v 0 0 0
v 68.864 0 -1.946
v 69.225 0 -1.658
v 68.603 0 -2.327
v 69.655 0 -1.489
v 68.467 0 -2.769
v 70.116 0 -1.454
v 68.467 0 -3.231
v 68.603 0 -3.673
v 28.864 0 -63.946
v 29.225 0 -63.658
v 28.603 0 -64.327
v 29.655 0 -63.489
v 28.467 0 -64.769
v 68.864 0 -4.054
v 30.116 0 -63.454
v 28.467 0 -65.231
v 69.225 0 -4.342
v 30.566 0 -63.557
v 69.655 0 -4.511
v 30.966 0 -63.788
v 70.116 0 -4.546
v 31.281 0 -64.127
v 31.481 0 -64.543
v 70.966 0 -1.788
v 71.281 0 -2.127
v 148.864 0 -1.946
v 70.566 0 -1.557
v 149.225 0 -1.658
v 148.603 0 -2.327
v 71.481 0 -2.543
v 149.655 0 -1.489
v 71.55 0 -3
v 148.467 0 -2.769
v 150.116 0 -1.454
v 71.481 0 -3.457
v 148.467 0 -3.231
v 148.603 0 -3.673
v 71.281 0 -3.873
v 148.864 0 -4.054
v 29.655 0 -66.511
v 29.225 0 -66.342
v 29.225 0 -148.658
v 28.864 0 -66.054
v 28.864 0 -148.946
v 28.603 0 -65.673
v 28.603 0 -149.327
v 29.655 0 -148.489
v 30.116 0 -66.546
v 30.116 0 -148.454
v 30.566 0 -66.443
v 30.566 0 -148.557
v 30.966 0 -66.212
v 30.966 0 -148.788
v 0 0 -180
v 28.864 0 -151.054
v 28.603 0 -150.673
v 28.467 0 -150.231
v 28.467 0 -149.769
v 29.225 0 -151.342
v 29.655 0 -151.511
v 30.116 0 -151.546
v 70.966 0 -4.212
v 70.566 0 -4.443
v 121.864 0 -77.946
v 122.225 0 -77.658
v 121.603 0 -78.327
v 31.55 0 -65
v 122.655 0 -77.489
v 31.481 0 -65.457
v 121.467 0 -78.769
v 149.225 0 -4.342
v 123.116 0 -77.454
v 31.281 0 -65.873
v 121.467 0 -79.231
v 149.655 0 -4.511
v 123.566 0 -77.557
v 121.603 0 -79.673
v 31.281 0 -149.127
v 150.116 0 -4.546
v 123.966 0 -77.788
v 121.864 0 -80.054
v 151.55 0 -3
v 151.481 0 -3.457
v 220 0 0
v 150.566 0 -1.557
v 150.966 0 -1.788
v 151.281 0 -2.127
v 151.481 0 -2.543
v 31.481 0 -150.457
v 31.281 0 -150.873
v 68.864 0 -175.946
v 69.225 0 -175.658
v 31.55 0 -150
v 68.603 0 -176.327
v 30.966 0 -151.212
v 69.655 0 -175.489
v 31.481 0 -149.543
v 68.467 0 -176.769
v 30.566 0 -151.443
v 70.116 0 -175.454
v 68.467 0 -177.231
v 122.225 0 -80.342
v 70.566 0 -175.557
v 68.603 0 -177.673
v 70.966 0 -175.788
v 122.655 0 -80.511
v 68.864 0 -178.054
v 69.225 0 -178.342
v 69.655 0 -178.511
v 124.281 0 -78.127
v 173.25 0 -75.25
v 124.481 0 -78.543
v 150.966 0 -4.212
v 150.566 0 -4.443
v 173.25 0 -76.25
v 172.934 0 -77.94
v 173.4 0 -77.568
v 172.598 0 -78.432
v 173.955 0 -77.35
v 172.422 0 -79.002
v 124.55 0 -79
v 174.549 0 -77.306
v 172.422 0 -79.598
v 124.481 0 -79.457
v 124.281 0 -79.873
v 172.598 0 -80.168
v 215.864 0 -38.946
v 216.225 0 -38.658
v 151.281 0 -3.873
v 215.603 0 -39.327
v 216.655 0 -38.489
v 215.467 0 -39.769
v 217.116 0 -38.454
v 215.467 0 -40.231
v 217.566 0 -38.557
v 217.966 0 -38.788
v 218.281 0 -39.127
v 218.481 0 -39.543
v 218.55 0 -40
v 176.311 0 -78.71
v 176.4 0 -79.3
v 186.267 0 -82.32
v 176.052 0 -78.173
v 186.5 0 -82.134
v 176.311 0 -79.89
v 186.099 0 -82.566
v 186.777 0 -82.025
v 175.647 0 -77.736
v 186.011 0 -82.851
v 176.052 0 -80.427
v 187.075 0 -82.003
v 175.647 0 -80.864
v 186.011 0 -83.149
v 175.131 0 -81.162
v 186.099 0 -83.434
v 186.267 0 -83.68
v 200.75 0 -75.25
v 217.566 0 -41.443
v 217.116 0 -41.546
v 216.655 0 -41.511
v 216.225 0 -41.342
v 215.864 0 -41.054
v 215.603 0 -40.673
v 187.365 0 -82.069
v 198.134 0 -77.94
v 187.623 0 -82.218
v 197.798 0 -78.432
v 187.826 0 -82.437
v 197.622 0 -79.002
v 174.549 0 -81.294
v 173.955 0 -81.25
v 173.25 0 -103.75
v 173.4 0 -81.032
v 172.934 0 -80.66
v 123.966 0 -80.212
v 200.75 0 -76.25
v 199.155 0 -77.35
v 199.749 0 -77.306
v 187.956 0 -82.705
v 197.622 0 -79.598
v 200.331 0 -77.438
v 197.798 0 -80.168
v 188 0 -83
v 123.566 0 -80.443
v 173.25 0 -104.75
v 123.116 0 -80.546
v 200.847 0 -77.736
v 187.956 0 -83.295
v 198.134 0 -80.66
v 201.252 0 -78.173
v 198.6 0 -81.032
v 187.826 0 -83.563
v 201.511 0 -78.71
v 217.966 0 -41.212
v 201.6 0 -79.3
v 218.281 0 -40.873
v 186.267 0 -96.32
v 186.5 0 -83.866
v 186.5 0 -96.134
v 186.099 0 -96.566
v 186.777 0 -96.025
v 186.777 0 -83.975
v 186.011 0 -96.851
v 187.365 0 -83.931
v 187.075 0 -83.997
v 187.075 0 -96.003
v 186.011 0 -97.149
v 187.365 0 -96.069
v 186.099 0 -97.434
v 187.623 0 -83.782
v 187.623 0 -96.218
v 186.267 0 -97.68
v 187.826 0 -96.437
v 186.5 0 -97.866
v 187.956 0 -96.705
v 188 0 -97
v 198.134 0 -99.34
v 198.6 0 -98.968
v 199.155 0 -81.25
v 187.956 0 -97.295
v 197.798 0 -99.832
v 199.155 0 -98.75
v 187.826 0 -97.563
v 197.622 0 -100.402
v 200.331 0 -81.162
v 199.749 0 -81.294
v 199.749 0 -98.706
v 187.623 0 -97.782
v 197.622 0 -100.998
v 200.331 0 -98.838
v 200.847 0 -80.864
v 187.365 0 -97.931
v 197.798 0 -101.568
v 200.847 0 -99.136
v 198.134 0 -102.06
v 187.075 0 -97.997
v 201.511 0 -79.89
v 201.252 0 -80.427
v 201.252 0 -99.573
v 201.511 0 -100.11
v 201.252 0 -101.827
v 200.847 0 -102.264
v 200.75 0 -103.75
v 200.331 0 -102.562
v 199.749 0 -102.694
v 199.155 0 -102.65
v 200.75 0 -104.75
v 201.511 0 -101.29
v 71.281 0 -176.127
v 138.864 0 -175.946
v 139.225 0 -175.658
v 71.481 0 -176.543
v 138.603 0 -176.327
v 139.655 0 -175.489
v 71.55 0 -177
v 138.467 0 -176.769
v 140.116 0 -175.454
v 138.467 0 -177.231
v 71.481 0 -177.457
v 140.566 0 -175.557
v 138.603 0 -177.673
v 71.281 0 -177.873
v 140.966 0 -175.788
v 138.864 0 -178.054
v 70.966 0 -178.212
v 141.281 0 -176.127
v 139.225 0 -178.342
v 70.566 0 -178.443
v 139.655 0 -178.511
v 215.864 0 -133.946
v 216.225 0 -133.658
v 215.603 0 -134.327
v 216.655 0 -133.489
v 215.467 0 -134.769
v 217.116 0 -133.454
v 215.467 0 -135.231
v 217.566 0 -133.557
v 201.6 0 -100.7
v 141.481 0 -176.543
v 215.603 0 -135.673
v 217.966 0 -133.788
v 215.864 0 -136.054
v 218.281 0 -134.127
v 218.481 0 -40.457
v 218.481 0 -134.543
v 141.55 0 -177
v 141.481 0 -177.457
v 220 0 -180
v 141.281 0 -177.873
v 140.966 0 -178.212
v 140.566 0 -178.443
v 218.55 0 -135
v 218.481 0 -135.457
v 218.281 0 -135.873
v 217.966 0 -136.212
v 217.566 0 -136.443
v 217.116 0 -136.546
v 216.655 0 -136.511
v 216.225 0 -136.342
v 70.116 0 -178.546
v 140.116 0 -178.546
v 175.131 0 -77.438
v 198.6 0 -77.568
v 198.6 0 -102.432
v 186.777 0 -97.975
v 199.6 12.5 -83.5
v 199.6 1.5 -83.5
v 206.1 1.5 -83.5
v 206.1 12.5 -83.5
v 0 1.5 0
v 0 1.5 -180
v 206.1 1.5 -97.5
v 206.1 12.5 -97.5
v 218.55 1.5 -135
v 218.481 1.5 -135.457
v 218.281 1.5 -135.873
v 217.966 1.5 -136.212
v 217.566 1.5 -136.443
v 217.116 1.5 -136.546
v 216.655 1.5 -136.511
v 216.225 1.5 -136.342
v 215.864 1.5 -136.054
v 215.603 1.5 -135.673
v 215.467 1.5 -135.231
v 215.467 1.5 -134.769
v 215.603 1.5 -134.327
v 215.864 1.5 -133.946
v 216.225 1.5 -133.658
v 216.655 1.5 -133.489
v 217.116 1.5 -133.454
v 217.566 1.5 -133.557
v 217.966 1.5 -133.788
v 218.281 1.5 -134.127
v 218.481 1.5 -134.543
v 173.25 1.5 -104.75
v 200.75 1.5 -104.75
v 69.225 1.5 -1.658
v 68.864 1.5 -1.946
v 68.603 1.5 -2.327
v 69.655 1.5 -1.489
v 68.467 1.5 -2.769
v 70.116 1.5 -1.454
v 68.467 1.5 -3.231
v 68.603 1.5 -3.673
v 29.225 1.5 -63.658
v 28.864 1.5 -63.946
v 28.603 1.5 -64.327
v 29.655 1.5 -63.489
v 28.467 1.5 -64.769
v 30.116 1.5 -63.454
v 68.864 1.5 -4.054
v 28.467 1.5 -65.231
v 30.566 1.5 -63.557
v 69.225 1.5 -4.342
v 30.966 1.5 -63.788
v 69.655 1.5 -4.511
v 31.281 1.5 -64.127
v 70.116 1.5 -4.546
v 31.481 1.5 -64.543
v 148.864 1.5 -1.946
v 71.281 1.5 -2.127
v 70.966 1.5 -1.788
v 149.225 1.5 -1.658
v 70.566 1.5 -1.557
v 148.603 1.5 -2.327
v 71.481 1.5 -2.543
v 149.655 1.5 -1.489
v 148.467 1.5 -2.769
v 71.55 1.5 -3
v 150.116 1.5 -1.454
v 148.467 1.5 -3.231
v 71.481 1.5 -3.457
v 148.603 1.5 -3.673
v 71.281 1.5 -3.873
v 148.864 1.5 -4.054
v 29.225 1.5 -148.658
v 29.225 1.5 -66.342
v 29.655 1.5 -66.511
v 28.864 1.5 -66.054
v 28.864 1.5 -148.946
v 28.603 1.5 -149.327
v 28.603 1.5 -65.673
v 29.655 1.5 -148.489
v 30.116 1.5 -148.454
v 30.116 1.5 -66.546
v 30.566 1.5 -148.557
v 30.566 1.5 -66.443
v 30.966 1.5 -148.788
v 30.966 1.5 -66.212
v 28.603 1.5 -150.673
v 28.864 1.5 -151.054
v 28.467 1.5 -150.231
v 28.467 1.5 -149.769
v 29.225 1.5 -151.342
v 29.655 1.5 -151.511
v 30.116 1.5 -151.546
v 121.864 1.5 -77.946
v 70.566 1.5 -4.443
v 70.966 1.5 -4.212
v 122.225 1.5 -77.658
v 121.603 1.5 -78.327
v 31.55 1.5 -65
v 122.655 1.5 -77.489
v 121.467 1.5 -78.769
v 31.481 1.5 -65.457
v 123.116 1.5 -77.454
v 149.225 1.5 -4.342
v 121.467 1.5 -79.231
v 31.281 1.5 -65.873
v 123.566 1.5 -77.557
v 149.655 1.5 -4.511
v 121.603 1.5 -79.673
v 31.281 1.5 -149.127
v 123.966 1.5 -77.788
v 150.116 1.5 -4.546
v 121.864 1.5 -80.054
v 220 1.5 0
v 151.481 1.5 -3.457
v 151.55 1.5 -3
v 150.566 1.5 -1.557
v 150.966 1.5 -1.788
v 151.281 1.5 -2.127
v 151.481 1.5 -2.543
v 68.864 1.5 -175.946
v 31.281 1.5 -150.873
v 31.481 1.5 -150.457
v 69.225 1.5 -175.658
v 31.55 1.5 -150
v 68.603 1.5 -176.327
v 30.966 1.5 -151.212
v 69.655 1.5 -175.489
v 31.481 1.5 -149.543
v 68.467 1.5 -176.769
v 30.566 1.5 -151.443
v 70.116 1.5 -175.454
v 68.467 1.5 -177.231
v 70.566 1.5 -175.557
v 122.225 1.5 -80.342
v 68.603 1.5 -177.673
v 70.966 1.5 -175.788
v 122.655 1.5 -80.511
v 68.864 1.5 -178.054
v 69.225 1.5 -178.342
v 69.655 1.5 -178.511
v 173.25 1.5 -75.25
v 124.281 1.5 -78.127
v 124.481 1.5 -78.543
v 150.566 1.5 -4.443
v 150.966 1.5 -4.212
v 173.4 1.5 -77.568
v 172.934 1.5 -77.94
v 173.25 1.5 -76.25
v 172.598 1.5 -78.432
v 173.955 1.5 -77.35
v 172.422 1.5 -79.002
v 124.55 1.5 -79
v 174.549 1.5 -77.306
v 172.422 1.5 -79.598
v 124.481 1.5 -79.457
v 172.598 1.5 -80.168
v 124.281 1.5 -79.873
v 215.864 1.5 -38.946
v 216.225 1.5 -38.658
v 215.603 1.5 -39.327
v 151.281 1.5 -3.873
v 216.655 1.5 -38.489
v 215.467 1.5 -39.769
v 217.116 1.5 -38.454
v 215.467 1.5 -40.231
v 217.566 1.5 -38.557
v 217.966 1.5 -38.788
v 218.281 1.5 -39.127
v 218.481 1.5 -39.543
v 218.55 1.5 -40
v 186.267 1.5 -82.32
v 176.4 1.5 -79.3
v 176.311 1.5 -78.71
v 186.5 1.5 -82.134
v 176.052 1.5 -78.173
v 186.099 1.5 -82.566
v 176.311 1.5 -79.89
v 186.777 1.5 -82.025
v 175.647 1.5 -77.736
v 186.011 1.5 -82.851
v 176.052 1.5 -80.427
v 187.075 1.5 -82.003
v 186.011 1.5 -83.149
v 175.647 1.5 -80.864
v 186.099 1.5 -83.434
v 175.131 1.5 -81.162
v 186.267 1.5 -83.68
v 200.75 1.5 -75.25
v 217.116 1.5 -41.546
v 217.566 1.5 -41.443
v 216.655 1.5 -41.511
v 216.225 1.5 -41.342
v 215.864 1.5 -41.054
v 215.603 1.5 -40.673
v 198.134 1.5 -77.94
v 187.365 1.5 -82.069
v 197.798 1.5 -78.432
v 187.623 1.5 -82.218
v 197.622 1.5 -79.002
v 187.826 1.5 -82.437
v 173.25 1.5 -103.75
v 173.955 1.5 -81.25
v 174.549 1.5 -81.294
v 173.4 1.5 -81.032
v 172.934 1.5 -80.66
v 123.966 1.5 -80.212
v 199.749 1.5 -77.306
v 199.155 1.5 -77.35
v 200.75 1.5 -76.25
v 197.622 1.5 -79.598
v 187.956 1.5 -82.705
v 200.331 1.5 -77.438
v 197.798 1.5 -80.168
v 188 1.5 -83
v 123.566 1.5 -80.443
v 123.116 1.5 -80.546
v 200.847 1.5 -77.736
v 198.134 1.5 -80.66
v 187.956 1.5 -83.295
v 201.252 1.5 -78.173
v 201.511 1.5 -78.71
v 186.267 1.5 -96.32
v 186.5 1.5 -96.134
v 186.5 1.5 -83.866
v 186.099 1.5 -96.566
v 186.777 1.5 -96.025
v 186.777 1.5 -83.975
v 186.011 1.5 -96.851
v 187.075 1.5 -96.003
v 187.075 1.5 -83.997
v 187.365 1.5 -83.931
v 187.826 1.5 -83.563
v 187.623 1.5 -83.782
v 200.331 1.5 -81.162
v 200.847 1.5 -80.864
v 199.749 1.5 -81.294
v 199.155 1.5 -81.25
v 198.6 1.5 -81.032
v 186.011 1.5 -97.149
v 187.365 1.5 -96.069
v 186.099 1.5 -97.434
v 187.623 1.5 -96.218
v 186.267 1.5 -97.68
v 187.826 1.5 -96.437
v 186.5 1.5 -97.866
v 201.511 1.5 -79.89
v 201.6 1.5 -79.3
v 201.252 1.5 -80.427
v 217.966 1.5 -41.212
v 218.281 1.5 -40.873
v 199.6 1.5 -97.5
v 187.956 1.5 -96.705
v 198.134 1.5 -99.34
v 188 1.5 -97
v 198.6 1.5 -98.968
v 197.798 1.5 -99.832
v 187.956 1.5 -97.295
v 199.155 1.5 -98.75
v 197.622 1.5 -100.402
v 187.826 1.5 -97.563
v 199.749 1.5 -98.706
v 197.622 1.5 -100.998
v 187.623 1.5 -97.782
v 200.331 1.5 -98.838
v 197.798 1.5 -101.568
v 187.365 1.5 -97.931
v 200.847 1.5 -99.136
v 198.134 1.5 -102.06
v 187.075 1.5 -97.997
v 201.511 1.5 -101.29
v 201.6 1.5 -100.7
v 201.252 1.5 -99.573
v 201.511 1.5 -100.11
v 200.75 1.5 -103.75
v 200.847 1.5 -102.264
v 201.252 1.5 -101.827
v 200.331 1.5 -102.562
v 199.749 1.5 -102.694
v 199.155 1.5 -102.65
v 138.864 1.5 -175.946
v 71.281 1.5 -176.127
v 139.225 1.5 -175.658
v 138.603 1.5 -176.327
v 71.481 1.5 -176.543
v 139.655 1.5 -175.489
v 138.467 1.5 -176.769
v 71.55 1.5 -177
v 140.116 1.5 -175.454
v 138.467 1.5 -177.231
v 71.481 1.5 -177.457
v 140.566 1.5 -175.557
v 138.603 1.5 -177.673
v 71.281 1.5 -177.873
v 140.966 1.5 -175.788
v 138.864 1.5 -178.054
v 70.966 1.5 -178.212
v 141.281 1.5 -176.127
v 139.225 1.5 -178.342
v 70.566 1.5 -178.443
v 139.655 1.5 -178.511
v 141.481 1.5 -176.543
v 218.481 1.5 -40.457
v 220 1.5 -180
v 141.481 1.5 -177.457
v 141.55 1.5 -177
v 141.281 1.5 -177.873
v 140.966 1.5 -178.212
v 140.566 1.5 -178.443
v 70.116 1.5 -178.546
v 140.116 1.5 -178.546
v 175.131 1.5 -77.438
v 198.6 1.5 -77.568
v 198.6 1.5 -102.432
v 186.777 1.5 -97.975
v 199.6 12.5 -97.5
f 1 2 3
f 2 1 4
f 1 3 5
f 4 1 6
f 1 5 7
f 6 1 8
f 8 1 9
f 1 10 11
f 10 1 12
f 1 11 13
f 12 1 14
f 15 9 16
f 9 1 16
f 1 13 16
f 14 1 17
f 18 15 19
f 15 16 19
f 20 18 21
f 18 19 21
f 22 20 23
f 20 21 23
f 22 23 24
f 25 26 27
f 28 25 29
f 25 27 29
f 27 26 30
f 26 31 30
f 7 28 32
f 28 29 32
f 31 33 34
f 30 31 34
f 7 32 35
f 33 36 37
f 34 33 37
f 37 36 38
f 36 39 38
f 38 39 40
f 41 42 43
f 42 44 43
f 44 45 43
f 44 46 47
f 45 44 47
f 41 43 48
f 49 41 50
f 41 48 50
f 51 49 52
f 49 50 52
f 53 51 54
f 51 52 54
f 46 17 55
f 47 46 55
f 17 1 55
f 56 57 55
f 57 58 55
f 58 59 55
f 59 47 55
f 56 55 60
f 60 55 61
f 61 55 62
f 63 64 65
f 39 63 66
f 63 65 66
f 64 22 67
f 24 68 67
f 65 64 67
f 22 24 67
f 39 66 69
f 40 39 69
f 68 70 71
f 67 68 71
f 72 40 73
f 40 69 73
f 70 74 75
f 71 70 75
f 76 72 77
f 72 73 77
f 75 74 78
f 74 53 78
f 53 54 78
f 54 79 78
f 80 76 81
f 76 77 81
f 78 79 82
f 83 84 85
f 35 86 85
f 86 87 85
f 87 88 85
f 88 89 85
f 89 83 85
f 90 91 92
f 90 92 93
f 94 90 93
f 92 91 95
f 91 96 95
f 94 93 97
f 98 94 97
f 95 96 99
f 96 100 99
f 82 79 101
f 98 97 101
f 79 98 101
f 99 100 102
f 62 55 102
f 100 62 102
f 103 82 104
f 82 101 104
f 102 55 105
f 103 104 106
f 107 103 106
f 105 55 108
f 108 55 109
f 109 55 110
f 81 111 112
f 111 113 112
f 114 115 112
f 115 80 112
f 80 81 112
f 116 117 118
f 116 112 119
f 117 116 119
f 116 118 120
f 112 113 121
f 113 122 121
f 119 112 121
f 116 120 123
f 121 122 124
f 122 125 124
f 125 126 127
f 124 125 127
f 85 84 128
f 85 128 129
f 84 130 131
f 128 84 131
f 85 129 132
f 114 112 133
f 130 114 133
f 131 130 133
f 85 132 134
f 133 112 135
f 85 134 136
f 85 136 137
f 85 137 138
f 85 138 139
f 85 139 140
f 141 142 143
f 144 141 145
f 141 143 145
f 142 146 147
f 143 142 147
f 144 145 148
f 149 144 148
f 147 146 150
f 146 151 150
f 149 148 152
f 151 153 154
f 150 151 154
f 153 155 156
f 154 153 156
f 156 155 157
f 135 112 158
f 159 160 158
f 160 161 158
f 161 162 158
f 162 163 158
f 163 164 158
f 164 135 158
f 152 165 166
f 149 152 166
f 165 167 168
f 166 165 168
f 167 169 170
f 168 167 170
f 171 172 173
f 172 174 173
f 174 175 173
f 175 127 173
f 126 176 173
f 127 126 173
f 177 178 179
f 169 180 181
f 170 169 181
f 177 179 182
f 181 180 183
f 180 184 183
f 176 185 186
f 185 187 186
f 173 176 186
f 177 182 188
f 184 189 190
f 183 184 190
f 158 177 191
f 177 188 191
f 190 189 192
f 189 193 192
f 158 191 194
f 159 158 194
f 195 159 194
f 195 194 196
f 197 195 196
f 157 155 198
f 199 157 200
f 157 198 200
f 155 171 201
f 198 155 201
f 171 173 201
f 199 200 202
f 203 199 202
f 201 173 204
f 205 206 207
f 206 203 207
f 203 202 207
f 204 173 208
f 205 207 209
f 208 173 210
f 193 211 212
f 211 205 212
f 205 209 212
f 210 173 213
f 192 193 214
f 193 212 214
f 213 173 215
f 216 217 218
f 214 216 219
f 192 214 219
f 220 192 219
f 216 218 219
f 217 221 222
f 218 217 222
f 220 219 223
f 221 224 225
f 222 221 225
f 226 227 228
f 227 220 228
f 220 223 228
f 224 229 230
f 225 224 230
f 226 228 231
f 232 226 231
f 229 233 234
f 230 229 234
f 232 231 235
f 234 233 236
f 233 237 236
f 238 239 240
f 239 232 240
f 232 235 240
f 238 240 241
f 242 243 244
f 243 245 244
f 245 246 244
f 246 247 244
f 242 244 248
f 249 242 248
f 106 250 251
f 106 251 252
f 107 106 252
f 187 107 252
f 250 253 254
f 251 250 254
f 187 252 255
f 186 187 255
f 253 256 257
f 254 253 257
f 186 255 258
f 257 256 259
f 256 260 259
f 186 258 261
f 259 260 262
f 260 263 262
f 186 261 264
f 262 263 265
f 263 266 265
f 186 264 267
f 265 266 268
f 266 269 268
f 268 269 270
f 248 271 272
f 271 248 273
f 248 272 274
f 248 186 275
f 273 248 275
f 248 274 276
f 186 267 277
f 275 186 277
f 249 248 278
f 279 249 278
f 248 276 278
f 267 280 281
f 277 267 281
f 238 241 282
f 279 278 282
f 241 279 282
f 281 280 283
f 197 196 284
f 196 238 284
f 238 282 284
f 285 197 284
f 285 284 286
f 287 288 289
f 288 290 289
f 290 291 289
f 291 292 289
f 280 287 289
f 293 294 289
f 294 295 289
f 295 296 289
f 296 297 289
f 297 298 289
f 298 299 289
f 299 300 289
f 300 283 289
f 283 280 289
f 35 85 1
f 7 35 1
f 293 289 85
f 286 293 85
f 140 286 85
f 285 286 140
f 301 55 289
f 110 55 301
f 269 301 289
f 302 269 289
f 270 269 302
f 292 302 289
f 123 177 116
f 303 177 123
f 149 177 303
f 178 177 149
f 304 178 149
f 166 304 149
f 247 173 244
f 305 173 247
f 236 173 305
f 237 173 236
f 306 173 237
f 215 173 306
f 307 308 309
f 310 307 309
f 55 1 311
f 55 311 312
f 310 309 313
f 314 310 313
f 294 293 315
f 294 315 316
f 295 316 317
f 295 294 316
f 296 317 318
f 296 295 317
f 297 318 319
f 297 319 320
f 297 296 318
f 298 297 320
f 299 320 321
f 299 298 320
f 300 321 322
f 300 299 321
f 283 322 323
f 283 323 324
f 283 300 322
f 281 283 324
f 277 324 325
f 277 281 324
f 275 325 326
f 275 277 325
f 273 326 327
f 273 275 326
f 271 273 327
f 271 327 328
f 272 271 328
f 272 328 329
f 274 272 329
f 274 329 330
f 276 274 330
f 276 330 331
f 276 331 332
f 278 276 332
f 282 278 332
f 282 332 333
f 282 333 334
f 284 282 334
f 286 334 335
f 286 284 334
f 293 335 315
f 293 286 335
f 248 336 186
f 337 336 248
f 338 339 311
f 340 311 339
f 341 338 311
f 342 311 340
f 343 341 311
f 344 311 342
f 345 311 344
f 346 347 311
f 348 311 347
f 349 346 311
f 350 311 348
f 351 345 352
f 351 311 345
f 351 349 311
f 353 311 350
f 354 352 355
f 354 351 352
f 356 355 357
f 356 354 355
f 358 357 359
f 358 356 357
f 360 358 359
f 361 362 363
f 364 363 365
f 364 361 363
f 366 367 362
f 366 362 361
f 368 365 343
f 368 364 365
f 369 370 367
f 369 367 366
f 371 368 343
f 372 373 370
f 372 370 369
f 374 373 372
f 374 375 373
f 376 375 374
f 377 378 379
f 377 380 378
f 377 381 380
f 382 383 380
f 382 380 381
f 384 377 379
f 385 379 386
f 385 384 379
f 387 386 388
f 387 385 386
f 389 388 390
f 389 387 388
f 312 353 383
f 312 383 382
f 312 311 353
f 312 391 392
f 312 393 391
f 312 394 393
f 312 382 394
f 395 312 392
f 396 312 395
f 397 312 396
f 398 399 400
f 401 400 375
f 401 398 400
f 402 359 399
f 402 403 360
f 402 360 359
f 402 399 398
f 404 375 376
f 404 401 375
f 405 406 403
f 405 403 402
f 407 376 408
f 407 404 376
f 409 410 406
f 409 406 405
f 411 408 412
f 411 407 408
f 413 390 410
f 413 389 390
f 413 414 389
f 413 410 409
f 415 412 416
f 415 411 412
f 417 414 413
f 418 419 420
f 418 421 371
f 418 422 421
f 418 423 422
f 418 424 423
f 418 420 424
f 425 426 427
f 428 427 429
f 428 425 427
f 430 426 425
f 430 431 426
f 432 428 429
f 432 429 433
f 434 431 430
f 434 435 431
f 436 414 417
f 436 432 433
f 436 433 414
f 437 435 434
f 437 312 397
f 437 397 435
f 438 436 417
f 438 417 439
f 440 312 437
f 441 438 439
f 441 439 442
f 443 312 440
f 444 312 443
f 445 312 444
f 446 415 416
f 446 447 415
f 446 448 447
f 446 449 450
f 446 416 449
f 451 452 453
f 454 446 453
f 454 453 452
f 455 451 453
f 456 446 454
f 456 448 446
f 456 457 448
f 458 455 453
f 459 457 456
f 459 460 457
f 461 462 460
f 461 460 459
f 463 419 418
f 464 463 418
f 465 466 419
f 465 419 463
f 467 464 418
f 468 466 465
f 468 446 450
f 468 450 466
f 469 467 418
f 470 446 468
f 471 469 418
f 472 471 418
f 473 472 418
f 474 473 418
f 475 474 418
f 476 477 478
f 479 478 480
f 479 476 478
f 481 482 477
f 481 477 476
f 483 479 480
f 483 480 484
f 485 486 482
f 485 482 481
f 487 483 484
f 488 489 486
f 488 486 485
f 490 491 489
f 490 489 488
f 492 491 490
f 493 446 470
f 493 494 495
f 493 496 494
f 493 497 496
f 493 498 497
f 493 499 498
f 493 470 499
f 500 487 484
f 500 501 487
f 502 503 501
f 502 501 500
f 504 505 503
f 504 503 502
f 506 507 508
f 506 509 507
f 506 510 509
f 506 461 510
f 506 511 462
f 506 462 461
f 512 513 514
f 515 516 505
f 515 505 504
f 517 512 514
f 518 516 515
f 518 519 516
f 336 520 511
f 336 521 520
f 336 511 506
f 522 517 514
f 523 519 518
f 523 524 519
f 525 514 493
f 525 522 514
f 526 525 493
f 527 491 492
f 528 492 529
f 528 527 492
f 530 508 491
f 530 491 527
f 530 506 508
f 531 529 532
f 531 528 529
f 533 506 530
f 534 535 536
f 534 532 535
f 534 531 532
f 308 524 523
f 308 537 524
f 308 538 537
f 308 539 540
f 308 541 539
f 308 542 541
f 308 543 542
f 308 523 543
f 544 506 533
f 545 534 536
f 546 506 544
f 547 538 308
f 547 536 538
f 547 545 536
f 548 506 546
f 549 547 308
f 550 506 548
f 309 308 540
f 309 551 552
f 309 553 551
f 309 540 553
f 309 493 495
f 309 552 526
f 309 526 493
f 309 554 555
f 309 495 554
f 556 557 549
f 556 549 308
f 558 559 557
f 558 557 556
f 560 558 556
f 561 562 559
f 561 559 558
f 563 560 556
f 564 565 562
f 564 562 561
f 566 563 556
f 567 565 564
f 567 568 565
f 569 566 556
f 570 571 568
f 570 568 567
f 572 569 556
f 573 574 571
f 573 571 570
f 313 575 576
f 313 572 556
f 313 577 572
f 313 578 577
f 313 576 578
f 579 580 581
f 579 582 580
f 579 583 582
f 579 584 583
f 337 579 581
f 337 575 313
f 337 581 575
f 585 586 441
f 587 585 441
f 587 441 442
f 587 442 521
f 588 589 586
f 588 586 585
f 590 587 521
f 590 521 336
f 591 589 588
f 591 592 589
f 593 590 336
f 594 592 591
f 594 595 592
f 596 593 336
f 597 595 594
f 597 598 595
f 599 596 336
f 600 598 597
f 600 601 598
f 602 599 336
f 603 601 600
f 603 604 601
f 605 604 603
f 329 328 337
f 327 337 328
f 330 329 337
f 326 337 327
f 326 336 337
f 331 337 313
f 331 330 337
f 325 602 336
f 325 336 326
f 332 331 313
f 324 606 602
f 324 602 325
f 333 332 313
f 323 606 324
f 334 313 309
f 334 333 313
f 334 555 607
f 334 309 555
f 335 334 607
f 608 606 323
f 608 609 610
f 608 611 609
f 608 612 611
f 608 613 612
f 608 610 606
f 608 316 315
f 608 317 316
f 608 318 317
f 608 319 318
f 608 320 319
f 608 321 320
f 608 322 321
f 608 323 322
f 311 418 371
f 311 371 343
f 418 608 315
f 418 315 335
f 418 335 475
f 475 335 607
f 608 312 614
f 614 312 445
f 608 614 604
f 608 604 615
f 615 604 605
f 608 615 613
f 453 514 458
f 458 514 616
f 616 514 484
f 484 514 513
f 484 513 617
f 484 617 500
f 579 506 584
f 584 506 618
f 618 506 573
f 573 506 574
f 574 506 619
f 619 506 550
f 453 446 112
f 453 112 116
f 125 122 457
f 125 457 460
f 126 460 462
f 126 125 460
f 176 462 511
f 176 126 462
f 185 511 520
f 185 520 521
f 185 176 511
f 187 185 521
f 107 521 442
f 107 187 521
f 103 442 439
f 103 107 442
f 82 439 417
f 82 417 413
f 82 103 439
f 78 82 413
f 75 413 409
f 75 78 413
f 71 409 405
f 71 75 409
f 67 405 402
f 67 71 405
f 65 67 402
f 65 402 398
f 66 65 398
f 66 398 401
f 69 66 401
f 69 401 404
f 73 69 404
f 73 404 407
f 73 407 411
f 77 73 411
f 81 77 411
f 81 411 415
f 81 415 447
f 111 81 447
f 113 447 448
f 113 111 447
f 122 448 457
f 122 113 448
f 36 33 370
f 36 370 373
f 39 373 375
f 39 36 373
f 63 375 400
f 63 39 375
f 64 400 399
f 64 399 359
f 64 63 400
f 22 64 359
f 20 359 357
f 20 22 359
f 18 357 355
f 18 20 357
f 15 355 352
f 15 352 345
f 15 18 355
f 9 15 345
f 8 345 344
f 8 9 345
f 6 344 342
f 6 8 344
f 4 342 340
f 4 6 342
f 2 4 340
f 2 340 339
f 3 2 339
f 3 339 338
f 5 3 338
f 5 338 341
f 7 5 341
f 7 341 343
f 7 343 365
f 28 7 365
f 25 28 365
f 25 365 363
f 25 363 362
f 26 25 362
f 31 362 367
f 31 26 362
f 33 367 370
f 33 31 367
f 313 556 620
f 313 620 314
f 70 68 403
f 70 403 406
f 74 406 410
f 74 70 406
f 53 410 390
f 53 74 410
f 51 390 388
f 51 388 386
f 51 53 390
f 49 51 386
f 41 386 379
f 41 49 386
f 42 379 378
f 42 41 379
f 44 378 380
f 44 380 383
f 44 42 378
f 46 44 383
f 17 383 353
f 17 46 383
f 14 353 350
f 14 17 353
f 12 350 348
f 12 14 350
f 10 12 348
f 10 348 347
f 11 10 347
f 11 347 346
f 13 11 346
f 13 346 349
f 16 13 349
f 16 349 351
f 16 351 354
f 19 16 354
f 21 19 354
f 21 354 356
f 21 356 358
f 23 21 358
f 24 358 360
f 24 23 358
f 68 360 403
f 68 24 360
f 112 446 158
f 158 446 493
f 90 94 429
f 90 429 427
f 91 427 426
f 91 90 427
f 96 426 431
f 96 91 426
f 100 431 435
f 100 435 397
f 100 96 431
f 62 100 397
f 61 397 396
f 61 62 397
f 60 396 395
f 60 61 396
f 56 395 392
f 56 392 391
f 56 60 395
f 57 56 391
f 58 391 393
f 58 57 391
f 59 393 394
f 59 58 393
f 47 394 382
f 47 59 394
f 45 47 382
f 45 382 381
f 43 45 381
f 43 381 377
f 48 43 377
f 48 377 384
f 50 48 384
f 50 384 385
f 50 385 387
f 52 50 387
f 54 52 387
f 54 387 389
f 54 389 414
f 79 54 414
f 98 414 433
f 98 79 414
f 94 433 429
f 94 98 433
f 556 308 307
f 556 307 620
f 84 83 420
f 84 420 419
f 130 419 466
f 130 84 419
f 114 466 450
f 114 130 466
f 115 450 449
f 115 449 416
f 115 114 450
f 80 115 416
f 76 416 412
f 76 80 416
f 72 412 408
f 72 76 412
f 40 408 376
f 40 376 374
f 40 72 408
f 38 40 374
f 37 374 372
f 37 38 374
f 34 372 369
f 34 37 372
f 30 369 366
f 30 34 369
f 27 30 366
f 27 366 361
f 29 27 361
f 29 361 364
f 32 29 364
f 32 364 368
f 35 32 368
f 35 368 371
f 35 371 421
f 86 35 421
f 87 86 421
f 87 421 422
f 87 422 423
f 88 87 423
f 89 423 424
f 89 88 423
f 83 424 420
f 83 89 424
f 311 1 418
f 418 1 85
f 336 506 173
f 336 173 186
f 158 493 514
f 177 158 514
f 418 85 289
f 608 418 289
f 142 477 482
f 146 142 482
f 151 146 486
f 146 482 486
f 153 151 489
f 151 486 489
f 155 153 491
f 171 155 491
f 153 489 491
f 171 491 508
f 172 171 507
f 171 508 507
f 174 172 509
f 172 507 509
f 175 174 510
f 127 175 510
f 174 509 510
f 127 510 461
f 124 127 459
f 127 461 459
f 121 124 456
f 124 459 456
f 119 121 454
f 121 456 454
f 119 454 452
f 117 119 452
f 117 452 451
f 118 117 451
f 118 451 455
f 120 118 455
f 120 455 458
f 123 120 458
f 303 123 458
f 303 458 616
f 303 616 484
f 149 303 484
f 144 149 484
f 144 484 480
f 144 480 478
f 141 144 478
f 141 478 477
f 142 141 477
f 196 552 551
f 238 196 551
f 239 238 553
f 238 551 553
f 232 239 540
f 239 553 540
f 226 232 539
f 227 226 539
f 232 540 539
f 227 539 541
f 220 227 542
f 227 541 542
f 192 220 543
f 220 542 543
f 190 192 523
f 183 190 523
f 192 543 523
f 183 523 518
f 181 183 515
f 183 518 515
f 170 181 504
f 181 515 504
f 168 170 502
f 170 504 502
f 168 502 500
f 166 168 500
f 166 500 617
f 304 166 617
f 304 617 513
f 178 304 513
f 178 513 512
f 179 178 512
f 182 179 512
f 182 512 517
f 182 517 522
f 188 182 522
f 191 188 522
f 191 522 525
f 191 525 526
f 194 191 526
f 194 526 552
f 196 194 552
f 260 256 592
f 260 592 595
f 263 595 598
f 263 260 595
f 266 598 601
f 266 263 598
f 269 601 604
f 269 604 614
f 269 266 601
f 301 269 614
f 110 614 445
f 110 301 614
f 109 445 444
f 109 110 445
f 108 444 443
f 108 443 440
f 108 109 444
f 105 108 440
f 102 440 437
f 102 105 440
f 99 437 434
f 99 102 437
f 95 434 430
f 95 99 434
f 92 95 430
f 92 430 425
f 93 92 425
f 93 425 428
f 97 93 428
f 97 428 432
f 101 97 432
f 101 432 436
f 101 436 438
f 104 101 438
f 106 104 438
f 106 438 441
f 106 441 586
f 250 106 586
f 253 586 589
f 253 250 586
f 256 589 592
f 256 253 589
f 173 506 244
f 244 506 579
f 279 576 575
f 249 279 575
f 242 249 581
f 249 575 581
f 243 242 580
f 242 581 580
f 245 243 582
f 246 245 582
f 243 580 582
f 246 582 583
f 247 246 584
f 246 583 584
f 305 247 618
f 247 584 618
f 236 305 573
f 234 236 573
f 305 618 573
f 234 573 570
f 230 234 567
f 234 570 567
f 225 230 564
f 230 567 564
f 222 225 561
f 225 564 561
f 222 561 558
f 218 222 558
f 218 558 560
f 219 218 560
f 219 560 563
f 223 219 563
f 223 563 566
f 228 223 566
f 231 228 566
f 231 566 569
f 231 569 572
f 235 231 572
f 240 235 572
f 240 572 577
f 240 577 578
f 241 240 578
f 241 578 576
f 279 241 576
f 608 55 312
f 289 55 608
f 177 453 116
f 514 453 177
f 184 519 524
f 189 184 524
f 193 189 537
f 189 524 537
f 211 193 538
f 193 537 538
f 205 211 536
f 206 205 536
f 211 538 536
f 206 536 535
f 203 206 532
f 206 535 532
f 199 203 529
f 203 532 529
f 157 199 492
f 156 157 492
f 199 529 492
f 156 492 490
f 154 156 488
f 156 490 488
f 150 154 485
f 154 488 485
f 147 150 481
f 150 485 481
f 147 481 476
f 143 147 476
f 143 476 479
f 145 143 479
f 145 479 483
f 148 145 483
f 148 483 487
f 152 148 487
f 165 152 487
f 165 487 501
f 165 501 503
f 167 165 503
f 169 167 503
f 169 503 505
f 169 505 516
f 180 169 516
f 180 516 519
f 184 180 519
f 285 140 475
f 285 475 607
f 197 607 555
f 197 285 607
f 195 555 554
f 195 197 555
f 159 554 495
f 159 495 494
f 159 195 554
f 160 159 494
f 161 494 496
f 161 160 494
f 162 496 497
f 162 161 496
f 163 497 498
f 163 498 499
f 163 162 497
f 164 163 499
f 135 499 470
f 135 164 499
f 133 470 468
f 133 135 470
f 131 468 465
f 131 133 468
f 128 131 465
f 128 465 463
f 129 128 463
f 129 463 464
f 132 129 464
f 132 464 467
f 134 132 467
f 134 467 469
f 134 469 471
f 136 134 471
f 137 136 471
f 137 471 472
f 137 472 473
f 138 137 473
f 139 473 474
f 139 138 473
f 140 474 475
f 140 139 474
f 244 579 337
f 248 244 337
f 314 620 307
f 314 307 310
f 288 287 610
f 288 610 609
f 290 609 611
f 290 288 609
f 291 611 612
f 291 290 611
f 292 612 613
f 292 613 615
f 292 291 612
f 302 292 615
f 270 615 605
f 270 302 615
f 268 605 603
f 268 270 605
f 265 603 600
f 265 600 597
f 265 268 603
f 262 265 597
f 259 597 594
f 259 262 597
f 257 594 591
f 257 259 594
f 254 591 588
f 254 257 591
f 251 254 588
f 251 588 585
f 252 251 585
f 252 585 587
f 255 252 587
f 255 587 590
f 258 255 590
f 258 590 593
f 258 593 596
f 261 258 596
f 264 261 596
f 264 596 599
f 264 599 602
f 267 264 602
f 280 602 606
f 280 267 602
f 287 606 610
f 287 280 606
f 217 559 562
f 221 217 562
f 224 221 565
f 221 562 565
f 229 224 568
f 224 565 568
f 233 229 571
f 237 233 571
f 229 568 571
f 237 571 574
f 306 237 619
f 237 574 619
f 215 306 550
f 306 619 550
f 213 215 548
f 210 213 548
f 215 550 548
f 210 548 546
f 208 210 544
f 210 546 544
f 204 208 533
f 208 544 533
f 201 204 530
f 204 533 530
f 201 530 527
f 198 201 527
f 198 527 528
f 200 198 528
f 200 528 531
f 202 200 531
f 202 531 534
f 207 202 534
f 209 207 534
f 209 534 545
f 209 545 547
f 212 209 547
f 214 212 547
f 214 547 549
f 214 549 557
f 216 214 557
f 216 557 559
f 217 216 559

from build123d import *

# Parameters (mm, degrees)
SKETCH1_W           = 220
SKETCH1_H           = 180
SKETCH1_R           = 1.55
BOSS_EXTRUDE1_DEPTH = 1.5
SKETCH_1_R          = 1
SKETCH_1_R_2        = 2
SKETCH_1_W          = 27.5
SKETCH_1_H          = 1
CUT_EXTRUDE_1_DEPTH = 2.5
SKETCH3_W           = 6.5
SKETCH3_H           = 14
BOSS_EXTRUDE2_DEPTH = 11


with BuildPart() as part:
    # Sketch1 → Boss-Extrude1 (new body)
    with BuildSketch(Plane(origin=(0, 0, 0), x_dir=(1, 0, 0), z_dir=(0, 1, 0))):
        with Locations((110, 90)):
            Rectangle(SKETCH1_W, SKETCH1_H)
        with Locations((70, 177)):
            Circle(SKETCH1_R, mode=Mode.SUBTRACT)
        with Locations((140, 177)):
            Circle(SKETCH1_R, mode=Mode.SUBTRACT)
        with Locations((30, 150)):
            Circle(SKETCH1_R, mode=Mode.SUBTRACT)
        with Locations((30, 65)):
            Circle(SKETCH1_R, mode=Mode.SUBTRACT)
        with Locations((217, 40)):
            Circle(SKETCH1_R, mode=Mode.SUBTRACT)
        with Locations((217, 135)):
            Circle(SKETCH1_R, mode=Mode.SUBTRACT)
        with Locations((70, 3)):
            Circle(SKETCH1_R, mode=Mode.SUBTRACT)
        with Locations((150, 3)):
            Circle(SKETCH1_R, mode=Mode.SUBTRACT)
        with Locations((123, 79)):
            Circle(SKETCH1_R, mode=Mode.SUBTRACT)
    extrude(amount=BOSS_EXTRUDE1_DEPTH)

    # Эскиз1 → Вырез-Вытянуть1 (cut, through all)
    with BuildSketch(Plane(origin=(0, 1.5, 0), x_dir=(1, 0, 0), z_dir=(0, 1, 0))):
        with Locations((187, 83)):
            Circle(SKETCH_1_R)
        with Locations((187, 97)):
            Circle(SKETCH_1_R)
        with Locations((199.6, 79.3)):
            Circle(SKETCH_1_R_2)
        with Locations((199.6, 100.7)):
            Circle(SKETCH_1_R_2)
        with Locations((174.4, 79.3)):
            Circle(SKETCH_1_R_2)
        with Locations((187, 75.75)):
            Rectangle(SKETCH_1_W, SKETCH_1_H)
        with Locations((187, 104.25)):
            Rectangle(SKETCH_1_W, SKETCH_1_H)
    extrude(amount=-CUT_EXTRUDE_1_DEPTH, mode=Mode.SUBTRACT)

    # Sketch3 → Boss-Extrude2 (add)
    with BuildSketch(Plane(origin=(0, 1.5, 0), x_dir=(1, 0, 0), z_dir=(0, 1, 0))):
        with Locations((202.85, 90.5)):
            Rectangle(SKETCH3_W, SKETCH3_H)
    extrude(amount=BOSS_EXTRUDE2_DEPTH)


solid = part.part
